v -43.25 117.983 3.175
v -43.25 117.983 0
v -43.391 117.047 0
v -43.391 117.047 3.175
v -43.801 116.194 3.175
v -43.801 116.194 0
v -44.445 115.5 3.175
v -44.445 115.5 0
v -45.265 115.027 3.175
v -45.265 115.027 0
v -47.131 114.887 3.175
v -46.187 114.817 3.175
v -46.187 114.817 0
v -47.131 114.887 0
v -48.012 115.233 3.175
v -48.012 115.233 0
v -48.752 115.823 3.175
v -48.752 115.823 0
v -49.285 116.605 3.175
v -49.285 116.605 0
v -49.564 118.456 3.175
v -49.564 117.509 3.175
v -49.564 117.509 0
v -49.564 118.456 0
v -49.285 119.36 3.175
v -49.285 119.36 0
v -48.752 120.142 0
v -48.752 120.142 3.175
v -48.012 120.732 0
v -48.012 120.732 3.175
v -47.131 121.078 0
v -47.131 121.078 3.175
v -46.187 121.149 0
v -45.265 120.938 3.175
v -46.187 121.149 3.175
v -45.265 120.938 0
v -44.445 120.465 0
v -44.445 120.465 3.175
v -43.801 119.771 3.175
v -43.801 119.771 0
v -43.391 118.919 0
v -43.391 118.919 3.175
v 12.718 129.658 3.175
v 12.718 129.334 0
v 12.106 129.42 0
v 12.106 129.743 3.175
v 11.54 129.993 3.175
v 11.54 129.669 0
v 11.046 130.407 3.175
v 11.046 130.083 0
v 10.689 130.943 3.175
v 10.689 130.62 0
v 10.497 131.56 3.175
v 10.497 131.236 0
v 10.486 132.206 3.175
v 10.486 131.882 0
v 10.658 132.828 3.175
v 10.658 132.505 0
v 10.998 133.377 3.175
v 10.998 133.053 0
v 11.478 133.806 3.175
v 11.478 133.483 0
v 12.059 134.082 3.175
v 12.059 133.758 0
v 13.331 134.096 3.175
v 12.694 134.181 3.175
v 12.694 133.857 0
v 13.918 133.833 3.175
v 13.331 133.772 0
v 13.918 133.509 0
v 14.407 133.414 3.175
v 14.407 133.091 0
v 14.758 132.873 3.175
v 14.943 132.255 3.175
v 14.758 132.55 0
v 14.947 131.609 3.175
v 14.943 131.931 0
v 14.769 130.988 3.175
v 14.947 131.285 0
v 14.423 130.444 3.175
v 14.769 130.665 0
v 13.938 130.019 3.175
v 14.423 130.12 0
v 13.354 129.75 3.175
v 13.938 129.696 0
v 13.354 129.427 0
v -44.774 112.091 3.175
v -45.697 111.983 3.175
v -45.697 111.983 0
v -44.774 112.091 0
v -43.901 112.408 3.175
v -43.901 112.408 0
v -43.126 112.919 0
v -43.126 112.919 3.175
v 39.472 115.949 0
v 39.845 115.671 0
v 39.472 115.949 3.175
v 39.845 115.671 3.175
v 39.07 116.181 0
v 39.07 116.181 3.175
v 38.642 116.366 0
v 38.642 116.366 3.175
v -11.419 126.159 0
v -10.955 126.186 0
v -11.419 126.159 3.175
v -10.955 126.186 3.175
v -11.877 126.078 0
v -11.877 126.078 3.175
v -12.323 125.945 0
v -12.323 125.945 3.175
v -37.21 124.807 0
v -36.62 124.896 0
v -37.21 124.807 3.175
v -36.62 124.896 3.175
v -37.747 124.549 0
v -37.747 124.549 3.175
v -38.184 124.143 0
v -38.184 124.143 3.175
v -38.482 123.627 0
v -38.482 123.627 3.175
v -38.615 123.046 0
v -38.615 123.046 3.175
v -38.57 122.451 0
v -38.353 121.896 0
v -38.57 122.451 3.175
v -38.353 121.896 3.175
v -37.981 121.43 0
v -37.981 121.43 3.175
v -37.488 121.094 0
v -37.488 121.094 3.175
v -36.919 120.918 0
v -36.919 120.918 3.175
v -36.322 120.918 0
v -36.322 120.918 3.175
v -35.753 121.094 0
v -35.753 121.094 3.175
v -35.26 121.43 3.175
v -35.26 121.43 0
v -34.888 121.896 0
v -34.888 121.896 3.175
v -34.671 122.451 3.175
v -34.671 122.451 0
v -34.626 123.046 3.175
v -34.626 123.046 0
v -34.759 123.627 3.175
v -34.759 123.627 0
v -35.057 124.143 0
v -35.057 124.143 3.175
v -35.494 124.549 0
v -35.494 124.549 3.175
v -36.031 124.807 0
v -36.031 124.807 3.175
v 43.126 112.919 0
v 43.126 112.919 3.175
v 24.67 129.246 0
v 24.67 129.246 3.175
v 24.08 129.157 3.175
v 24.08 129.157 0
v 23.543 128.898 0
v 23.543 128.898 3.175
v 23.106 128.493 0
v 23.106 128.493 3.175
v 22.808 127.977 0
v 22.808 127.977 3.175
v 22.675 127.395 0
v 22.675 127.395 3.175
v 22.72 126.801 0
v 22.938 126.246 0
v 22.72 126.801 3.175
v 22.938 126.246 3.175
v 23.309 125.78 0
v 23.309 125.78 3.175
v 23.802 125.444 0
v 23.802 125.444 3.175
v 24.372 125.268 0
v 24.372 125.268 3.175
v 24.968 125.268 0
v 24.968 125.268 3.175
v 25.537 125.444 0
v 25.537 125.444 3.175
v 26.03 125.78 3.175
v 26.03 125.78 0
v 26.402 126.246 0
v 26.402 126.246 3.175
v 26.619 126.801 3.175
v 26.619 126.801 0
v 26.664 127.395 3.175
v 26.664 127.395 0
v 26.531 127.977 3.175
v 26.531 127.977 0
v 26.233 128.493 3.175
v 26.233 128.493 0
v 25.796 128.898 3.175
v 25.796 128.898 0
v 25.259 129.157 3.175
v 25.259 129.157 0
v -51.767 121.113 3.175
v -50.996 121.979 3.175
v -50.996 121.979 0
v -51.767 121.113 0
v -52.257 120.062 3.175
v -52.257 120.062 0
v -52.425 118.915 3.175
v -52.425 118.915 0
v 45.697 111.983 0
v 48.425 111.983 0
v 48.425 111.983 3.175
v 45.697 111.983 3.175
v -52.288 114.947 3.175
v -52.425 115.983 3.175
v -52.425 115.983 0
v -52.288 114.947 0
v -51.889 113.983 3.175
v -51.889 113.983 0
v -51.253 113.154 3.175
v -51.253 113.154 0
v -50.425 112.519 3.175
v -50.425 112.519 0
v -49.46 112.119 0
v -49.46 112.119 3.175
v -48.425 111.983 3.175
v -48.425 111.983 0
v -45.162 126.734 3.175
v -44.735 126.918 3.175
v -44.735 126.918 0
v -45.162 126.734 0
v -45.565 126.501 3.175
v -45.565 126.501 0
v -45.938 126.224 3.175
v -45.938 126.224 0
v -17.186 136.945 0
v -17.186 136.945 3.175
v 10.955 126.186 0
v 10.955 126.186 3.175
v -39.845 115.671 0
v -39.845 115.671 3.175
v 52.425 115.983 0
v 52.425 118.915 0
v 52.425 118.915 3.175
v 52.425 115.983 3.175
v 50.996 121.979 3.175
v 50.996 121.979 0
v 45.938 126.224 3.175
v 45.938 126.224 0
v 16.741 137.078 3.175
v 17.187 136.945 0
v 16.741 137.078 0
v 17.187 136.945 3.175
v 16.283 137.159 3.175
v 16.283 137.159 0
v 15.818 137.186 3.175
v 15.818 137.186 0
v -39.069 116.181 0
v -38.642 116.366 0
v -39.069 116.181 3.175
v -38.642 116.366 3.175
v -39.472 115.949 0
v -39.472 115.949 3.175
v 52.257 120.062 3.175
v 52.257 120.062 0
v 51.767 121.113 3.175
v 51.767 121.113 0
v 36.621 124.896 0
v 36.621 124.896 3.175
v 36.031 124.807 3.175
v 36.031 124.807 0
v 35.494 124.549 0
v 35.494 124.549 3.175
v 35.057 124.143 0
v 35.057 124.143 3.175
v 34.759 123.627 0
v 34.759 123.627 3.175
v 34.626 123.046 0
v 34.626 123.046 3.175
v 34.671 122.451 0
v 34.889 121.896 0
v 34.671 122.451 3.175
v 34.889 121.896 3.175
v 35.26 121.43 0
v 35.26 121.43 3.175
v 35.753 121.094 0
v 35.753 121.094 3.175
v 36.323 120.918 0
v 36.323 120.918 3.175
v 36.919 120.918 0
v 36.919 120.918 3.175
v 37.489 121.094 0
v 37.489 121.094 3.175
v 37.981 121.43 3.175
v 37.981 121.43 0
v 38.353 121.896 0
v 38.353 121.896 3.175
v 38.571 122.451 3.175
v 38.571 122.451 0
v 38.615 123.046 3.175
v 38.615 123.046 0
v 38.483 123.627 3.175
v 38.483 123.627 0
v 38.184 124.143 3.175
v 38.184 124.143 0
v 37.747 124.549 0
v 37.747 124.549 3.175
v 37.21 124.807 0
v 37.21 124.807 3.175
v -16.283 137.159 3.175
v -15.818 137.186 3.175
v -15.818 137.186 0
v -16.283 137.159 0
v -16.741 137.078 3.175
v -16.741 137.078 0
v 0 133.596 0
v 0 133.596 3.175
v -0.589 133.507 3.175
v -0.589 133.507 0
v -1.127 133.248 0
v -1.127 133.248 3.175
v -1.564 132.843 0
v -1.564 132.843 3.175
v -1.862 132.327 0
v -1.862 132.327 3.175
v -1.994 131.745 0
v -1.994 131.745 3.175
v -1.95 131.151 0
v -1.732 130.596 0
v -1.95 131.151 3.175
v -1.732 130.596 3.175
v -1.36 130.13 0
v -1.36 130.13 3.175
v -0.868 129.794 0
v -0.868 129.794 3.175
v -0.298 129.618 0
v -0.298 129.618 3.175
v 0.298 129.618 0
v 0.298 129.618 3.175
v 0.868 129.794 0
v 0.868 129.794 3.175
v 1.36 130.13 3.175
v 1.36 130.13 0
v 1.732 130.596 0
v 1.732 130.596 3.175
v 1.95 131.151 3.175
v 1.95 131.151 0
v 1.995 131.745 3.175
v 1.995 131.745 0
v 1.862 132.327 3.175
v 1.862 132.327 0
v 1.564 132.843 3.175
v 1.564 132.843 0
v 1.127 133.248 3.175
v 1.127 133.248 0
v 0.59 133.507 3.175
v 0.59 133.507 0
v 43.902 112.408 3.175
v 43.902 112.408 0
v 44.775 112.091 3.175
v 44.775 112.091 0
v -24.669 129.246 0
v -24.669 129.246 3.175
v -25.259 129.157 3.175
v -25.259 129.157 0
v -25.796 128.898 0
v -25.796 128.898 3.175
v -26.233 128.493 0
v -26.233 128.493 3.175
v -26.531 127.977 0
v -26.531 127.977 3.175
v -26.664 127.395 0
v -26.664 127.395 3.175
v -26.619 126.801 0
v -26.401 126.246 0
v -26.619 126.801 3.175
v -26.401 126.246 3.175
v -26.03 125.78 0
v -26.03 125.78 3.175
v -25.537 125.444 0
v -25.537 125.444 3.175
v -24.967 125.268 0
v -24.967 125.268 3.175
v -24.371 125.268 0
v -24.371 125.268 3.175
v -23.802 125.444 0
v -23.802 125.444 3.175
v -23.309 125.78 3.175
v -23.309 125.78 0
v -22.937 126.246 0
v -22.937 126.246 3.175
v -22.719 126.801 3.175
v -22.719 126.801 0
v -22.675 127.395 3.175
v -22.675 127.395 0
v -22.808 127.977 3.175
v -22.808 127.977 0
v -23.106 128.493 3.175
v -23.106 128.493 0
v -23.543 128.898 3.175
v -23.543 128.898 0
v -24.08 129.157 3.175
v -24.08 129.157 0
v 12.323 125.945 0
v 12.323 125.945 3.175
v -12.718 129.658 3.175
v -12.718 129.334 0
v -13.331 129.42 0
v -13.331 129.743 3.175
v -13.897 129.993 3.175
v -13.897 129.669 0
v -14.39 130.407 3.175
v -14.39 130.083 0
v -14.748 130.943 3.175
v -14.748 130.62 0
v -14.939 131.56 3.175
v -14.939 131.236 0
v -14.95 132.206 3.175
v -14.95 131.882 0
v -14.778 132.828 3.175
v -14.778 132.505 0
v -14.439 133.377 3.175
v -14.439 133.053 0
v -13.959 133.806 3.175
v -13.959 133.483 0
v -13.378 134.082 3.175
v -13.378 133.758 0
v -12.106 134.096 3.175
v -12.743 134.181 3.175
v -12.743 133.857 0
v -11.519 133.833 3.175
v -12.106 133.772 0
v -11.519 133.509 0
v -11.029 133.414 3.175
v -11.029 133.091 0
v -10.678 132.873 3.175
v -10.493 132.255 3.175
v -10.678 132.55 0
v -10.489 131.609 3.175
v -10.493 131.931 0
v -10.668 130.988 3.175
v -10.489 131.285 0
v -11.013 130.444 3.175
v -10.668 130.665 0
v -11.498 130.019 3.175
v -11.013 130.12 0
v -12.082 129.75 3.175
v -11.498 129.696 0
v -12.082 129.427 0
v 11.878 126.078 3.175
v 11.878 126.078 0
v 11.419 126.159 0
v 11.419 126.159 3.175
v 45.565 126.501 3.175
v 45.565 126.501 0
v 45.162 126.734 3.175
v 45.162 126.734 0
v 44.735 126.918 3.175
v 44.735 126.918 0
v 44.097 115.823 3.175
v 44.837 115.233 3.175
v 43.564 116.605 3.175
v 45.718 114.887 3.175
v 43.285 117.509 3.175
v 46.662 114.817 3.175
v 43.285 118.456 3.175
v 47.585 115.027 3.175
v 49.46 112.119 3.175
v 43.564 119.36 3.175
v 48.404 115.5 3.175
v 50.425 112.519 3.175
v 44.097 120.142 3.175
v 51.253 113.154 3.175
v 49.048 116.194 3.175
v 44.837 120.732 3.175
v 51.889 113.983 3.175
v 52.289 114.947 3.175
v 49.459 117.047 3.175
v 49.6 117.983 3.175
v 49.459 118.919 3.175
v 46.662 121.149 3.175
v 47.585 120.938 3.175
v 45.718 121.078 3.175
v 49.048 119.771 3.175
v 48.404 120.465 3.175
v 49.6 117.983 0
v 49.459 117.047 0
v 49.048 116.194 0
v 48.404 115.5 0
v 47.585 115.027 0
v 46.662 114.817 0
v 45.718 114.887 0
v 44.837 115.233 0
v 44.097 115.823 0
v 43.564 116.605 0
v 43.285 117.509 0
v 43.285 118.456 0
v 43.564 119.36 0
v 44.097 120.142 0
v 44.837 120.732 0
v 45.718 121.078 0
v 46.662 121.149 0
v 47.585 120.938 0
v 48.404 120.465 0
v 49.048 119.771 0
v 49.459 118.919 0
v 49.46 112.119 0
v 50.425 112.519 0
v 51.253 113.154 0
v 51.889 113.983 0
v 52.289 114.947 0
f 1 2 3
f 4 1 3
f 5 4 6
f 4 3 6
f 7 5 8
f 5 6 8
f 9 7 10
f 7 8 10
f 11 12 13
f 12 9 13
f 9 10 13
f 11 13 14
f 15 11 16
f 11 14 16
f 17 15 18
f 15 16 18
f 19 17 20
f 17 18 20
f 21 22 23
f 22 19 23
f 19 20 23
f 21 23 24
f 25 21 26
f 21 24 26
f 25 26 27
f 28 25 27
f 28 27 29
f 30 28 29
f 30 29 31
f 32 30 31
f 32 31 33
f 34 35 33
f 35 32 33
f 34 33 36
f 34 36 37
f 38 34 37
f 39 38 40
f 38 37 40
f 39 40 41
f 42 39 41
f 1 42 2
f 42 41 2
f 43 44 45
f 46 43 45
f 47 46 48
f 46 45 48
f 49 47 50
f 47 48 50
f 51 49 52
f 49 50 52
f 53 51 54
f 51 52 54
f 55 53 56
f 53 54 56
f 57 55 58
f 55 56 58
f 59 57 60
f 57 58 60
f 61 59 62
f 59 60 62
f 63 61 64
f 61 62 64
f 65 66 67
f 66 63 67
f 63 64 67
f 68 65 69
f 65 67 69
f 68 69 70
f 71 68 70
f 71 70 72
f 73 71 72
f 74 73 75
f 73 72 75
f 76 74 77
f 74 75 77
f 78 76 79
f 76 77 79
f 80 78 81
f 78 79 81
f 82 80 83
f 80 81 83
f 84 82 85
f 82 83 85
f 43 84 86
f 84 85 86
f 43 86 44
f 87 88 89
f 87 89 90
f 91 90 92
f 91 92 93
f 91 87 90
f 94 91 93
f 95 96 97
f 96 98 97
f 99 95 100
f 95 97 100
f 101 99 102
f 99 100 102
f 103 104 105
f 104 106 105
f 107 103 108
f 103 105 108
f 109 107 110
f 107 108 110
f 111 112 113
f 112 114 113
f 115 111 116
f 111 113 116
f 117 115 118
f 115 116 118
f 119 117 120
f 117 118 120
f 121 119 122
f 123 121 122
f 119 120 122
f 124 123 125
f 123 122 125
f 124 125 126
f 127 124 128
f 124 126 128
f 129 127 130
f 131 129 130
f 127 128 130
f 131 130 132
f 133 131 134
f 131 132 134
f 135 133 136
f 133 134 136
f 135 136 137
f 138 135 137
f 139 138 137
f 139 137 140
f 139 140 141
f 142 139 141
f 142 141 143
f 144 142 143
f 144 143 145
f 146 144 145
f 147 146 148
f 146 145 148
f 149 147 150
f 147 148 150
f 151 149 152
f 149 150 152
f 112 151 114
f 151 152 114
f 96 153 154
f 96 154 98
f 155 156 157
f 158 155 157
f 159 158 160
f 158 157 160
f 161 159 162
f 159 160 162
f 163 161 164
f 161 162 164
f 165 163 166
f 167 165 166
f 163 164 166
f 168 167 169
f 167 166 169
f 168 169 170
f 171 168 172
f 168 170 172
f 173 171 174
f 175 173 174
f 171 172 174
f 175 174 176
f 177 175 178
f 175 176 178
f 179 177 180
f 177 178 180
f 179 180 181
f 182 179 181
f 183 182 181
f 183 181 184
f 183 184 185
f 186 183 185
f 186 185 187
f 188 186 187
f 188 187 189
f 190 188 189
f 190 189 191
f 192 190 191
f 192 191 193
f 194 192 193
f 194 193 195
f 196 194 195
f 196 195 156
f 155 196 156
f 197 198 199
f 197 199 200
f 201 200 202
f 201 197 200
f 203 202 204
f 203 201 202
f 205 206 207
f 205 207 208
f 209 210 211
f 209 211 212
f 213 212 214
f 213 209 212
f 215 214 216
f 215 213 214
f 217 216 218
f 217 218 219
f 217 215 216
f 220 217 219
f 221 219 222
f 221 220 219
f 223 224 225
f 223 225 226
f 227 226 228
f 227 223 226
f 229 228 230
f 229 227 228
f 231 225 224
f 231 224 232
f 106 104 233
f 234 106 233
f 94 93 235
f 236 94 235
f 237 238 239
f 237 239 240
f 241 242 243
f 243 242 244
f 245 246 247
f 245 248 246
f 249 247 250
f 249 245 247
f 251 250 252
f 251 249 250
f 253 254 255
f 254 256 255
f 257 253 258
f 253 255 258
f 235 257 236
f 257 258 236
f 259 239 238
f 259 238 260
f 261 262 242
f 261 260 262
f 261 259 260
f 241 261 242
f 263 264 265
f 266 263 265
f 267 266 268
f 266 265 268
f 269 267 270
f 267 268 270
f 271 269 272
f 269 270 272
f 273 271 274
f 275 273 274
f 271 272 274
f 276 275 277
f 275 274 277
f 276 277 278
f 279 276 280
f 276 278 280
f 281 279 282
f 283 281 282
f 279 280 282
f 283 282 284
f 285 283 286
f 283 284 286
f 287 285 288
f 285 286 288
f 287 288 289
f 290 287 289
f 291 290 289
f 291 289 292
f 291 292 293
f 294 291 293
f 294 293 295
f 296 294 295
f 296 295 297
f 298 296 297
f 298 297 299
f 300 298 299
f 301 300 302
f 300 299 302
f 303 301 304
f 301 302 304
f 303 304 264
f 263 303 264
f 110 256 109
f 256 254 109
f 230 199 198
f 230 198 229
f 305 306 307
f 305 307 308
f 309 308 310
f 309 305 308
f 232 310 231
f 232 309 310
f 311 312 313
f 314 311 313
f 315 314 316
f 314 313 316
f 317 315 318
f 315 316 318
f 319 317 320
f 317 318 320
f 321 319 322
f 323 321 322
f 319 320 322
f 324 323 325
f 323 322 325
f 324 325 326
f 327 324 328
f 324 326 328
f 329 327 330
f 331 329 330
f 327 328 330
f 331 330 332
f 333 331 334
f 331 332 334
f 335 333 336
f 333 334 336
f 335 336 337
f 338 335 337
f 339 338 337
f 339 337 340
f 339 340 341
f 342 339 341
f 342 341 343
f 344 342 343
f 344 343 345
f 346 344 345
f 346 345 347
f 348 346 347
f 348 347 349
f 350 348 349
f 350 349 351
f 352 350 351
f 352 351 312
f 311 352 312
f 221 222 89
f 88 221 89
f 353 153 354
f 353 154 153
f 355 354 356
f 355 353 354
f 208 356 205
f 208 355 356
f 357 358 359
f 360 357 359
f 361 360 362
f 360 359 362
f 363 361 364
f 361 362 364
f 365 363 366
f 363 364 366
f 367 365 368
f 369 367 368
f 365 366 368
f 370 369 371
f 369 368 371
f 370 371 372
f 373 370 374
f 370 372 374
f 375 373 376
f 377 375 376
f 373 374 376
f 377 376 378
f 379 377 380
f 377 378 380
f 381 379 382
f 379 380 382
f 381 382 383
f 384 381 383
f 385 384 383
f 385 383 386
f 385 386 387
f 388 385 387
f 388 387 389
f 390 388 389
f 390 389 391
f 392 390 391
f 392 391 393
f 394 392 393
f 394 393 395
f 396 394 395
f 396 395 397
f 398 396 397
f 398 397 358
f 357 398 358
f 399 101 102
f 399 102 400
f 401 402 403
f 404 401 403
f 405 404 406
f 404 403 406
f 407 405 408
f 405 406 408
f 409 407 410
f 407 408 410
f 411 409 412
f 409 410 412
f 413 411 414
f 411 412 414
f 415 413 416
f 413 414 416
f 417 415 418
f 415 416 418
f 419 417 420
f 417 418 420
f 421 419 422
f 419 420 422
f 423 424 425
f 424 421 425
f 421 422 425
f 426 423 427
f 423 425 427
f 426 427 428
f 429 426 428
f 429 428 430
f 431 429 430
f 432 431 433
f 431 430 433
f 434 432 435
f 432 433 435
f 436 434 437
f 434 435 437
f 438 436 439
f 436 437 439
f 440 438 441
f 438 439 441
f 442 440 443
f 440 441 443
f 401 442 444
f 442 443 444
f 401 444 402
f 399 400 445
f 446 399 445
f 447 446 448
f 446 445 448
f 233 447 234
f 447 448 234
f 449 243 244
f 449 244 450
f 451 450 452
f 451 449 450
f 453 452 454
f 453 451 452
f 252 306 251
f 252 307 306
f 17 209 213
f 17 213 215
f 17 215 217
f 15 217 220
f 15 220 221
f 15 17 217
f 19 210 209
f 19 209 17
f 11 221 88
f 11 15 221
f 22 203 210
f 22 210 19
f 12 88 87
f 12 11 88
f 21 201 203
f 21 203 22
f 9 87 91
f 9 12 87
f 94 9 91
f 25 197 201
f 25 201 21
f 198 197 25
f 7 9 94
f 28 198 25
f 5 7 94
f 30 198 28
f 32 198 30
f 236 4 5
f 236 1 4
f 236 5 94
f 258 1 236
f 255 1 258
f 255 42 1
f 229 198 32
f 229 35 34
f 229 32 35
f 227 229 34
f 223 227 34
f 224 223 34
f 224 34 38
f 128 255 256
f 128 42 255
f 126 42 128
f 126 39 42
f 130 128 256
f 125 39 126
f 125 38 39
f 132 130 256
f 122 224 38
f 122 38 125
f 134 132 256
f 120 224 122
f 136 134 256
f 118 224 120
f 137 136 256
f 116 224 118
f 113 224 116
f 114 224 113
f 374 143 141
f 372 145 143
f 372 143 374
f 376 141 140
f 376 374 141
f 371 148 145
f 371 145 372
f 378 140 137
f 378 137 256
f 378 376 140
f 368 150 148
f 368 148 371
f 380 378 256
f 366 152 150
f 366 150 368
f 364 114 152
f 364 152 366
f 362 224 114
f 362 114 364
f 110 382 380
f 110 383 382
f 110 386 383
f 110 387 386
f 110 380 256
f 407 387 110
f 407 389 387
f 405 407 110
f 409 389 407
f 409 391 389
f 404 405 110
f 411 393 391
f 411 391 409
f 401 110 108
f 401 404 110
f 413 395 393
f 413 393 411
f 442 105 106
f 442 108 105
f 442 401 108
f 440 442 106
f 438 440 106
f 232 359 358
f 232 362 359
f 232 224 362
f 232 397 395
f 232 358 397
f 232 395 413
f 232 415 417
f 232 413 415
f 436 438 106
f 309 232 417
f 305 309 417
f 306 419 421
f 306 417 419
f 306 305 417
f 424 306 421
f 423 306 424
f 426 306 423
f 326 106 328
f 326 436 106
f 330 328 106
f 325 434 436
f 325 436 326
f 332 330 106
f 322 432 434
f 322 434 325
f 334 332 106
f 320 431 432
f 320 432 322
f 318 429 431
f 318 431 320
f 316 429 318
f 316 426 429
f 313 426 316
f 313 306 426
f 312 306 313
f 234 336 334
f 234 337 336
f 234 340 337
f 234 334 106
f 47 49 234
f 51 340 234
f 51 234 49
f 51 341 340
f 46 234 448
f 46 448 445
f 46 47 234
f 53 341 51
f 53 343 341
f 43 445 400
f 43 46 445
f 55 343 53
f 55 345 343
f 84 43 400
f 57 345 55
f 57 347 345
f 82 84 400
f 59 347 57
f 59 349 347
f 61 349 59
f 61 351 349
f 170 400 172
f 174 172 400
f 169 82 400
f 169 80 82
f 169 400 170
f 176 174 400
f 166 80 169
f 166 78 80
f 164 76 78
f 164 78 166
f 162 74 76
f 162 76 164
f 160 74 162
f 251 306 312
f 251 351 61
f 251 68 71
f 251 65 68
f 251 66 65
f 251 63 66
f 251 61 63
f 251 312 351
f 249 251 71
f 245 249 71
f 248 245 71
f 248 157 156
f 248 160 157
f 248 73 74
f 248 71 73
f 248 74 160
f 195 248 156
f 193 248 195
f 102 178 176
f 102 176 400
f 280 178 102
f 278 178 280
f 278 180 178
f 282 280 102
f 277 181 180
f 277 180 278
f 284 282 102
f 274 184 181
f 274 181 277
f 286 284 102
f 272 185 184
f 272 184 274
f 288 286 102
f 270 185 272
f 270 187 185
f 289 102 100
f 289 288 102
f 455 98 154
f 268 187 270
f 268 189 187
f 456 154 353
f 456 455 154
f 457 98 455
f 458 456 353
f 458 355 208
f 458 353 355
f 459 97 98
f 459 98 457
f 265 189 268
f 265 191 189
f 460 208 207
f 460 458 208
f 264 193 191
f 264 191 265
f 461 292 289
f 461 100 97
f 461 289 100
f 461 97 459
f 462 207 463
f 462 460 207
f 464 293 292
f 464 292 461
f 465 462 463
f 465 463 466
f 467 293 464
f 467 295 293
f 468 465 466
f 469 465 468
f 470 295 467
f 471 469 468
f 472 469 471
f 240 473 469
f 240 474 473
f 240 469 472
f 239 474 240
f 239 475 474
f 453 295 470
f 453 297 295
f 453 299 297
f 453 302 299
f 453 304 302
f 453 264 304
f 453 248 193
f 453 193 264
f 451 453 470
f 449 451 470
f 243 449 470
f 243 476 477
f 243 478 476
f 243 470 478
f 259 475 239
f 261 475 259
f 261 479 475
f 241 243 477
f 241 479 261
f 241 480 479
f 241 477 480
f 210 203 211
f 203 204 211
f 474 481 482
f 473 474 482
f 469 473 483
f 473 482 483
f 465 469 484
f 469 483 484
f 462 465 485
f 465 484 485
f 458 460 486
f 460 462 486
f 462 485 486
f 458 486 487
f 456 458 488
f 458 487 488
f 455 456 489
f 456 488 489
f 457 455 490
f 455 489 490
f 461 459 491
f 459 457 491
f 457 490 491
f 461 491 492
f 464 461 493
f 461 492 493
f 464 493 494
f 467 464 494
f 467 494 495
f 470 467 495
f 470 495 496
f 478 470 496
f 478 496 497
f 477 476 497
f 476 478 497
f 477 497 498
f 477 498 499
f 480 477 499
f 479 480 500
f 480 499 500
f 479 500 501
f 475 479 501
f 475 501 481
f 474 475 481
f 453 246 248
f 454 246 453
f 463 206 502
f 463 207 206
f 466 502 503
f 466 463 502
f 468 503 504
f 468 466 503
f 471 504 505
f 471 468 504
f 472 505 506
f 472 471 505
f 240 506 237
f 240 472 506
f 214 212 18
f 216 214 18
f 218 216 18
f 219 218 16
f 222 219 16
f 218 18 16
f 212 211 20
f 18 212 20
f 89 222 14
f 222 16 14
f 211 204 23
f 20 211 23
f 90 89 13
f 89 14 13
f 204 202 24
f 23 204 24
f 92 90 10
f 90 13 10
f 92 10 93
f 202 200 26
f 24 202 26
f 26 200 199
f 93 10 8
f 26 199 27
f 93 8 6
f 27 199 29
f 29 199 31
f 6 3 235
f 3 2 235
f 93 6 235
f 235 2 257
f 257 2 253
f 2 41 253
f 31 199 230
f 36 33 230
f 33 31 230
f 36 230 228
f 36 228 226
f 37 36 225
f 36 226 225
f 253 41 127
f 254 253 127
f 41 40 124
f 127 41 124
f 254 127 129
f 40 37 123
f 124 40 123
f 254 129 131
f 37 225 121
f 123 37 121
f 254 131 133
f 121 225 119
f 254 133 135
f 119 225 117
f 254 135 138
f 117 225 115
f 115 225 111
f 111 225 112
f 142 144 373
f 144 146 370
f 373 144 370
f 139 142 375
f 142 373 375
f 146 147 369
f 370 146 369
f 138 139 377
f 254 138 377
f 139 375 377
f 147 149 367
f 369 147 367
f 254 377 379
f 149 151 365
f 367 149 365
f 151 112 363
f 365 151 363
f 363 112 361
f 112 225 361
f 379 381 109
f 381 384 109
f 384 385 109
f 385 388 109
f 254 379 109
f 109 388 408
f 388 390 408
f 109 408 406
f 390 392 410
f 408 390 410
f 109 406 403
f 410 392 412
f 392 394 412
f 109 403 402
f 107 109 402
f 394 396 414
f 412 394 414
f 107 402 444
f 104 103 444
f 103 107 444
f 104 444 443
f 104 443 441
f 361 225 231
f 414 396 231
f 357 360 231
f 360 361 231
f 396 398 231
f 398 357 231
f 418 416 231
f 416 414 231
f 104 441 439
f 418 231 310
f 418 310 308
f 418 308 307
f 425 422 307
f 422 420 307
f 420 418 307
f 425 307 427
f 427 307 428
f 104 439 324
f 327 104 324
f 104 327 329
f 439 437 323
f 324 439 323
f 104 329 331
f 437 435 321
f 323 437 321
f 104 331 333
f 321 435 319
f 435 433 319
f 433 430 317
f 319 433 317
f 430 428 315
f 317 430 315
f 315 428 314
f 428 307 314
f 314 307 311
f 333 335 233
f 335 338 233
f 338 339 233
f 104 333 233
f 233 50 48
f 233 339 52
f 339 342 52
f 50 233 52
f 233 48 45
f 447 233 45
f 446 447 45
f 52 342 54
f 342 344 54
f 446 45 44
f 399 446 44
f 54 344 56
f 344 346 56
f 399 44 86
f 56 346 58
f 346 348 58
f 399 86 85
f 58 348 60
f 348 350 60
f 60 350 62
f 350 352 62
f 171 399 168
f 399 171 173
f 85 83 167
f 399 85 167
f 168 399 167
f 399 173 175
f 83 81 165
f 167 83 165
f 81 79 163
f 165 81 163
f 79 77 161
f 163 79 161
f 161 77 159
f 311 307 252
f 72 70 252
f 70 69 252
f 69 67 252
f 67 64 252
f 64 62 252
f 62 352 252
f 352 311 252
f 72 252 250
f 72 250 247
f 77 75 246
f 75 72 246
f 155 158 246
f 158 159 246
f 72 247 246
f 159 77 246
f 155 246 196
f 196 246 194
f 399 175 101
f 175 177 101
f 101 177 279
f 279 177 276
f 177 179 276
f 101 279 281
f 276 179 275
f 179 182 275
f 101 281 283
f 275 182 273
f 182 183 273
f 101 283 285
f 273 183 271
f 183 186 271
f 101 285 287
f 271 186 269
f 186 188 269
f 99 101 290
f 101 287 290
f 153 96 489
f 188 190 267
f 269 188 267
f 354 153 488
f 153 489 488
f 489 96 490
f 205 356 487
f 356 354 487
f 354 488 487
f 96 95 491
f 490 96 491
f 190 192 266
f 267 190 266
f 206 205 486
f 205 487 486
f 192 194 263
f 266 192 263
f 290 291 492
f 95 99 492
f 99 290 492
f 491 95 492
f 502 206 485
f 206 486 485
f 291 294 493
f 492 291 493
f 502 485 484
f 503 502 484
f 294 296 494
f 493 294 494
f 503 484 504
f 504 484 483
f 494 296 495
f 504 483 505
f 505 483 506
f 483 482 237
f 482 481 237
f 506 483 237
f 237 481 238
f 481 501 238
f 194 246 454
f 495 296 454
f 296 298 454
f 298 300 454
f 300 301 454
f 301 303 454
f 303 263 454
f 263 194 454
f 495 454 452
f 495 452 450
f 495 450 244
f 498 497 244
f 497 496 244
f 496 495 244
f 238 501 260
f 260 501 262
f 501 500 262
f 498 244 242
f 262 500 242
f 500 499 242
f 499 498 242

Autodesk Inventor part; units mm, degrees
ref_plane "YZ Plane" through (0, 0, 0) normal (1, 0, 0) x (0, 1, 0)
ref_plane "XZ Plane" through (0, 0, 0) normal (0, 1, 0) x (-1, 0, 0)
ref_plane "XY Plane" through (0, 0, 0) normal (0, 0, 1) x (1, 0, 0)
sketch "Base" plane through (0, 0, 0) normal (0, 0, 1) x (1, 0, 0)
  circle A0 centre (-46.4246, 117.9827) radius 2.5
  line L0 (-52.4246, 120.7805) -> (-52.4246, 111.9827)
  line L1 (-52.4246, 111.9827) -> (-44.2408, 111.9827)
  line L2 (-52.4246, 120.7805) -> (-45.3975, 126.677)
  line L3 (-45.3975, 126.677) -> (-16.5235, 137.1863)
  line L4 (-44.2408, 111.9827) -> (-39.3049, 116.1244)
  line L5 (-39.3049, 116.1244) -> (-11.6601, 126.1863)
  line L6 (-11.6601, 126.1863) -> (0.0157, 126.1863)
  line L7 (-16.5235, 137.1863) -> (0, 137.1863)
  line L8 (0.0001, 252.4162) -> (0.0001, -227.6975)
  line L9 (52.4249, 120.7805) -> (52.4249, 111.9827)
  line L10 (52.4249, 111.9827) -> (44.2411, 111.9827)
  line L11 (52.4249, 120.7805) -> (45.3977, 126.677)
  line L12 (44.2411, 111.9827) -> (39.3052, 116.1244)
  line L13 (39.3052, 116.1244) -> (11.6604, 126.1863)
  line L14 (11.6604, 126.1863) -> (0.0157, 126.1863)
  line L15 (16.5238, 137.1863) -> (0, 137.1863)
  line L16 (16.5238, 137.1863) -> (45.3977, 126.677)
  ellipse E0 centre (-12.7181, 132.1863) end of major axis (-10.7181, 132.1863) minor radius 1.9897 construction
  ellipse E1 centre (12.7183, 132.1863) end of major axis (14.7183, 132.1863) minor radius 1.9897 construction
  circle A1 centre (-46.4246, 117.9827) radius 3.175
  circle A2 centre (46.4246, 117.9827) radius 3.175
  point P0 (0, 0)
  dimension "d1" = 5
  dimension "d2" = 6
  dimension "d3" = 6
  dimension "d5" = 12
  dimension "d6" = 160
  dimension "d7" = 160
  dimension "d8" = 6
  dimension "d9" = 6
  dimension "d10" = 6
  dimension "d11" = 6
  dimension "d20" = 5
extrude "Plate1" add sketch "Base" along normal blind 3.175 contours L2 L3 L7 L8 L6 L5 L4 L1 L0 | L15 L16 L11 L9 L10 L12 L13 L14 L6 L8
fillet "FilletsFeature" radius 4 14 edges at (-45.3975, 126.677, 1.5875) (-16.5235, 137.1863, 1.5875) (-52.4246, 120.7805, 1.5875) (-52.4246, 111.9827, 1.5875) (16.5238, 137.1863, 1.5875) (45.3977, 126.677, 1.5875) (52.4249, 120.7805, 1.5875) (52.4249, 111.9827, 1.5875) (44.2411, 111.9827, 1.5875) (39.3052, 116.1244, 1.5875) (11.6604, 126.1863, 1.5875) (-11.6601, 126.1863, 1.5875) (-39.3049, 116.1244, 1.5875) (-44.2408, 111.9827, 1.5875)
ref_plane "BentCutPlane" through (-12.7181, 132.4436, 8.3161) normal (0, 0.1014, 0.9948) x (0, -0.9948, 0.1014)
sketch "BentCutProfile" plane through (-12.7181, 132.4436, 8.3161) normal (0, 0.1014, 0.9948) x (0, -0.9948, 0.1014)
  circle A0 centre (0, 0) radius 2 projected
  circle A1 centre (0, 25.4364) radius 2 projected
  point P0 (130.9175, 12.7181)
hole "BentCutProfileHoleFeature" at (-12.7181, 132.4436, 8.3161) at (12.7183, 132.4436, 8.3161) direction (0, -0.1014, -0.9948) diameter 4.5 end through all
sketch "UtilityHoles" plane through (0, 0, 0) normal (0, 0, -1) x (-1, 0, 0)
  ellipse E0 centre (-12.7183, 131.5959) end of major axis (-12.7183, 129.3342) minor radius 2.25 projected
  ellipse E1 centre (12.7181, 131.5959) end of major axis (12.7181, 129.3342) minor radius 2.25 projected
  circle A0 centre (-46.4246, 117.9827) radius 3.175 projected
  line L0 (15.8182, 137.1863) -> (-15.8185, 137.1863) projected
  line L1 (-0.0001, 137.1863) -> (-0.0001, 126.1863)
  line L2 (10.9548, 126.1863) -> (-10.9551, 126.1863) projected
  line L3 (-12.7183, 131.5959) -> (-44.1201, 120.1666) construction
  line L4 (-12.3232, 125.945) -> (-38.6424, 116.3656) projected
  line L5 (-12.7183, 131.5959) -> (12.7181, 131.5959) construction
  circle A1 centre (-0.0001, 131.5959) radius 2
  circle A2 centre (-24.6696, 127.246) radius 2
  circle A3 centre (-36.6208, 122.8961) radius 2
  circle A4 centre (24.6693, 127.246) radius 2
  circle A5 centre (36.6205, 122.8961) radius 2
  point P0 (0, 0)
  dimension "d21" = 4
  dimension "d22" = 12.7182
  dimension "d23" = 12.7182
  dimension "d24" = 12.7182
hole "UtilityHolesFeature" at (36.6208, 122.8961, 0) at (24.6696, 127.246, 0) at (0.0001, 131.5959, 0) at (-24.6693, 127.246, 0) at (-36.6205, 122.8961, 0) direction (0, 0, 1) diameter 4 end through all
equation "\"d18\" = Thickness"
equation "\"d23\" = d22"
equation "\"d24\" = d22"
equation "\"d30\" = Thickness"
equation "\"d0\" = Thickness"
equation "\"BendRadius\" = Thickness"
equation "\"BendReliefWidth\" = Thickness"
equation "\"BendReliefDepth\" = 0.5 * Thickness"
equation "\"CornerReliefSize\" = 4 * Thickness"
equation "\"MinimumRemnant\" = 2 * Thickness"
equation "\"TransitionRadius\" = BendRadius"
equation "\"JacobiRadiusSize\" = BendRadius"
equation "\"GapSize\" = Thickness"
equation "\"Thickness\" = 3.175"
properties part number "HeadTopConnector"
